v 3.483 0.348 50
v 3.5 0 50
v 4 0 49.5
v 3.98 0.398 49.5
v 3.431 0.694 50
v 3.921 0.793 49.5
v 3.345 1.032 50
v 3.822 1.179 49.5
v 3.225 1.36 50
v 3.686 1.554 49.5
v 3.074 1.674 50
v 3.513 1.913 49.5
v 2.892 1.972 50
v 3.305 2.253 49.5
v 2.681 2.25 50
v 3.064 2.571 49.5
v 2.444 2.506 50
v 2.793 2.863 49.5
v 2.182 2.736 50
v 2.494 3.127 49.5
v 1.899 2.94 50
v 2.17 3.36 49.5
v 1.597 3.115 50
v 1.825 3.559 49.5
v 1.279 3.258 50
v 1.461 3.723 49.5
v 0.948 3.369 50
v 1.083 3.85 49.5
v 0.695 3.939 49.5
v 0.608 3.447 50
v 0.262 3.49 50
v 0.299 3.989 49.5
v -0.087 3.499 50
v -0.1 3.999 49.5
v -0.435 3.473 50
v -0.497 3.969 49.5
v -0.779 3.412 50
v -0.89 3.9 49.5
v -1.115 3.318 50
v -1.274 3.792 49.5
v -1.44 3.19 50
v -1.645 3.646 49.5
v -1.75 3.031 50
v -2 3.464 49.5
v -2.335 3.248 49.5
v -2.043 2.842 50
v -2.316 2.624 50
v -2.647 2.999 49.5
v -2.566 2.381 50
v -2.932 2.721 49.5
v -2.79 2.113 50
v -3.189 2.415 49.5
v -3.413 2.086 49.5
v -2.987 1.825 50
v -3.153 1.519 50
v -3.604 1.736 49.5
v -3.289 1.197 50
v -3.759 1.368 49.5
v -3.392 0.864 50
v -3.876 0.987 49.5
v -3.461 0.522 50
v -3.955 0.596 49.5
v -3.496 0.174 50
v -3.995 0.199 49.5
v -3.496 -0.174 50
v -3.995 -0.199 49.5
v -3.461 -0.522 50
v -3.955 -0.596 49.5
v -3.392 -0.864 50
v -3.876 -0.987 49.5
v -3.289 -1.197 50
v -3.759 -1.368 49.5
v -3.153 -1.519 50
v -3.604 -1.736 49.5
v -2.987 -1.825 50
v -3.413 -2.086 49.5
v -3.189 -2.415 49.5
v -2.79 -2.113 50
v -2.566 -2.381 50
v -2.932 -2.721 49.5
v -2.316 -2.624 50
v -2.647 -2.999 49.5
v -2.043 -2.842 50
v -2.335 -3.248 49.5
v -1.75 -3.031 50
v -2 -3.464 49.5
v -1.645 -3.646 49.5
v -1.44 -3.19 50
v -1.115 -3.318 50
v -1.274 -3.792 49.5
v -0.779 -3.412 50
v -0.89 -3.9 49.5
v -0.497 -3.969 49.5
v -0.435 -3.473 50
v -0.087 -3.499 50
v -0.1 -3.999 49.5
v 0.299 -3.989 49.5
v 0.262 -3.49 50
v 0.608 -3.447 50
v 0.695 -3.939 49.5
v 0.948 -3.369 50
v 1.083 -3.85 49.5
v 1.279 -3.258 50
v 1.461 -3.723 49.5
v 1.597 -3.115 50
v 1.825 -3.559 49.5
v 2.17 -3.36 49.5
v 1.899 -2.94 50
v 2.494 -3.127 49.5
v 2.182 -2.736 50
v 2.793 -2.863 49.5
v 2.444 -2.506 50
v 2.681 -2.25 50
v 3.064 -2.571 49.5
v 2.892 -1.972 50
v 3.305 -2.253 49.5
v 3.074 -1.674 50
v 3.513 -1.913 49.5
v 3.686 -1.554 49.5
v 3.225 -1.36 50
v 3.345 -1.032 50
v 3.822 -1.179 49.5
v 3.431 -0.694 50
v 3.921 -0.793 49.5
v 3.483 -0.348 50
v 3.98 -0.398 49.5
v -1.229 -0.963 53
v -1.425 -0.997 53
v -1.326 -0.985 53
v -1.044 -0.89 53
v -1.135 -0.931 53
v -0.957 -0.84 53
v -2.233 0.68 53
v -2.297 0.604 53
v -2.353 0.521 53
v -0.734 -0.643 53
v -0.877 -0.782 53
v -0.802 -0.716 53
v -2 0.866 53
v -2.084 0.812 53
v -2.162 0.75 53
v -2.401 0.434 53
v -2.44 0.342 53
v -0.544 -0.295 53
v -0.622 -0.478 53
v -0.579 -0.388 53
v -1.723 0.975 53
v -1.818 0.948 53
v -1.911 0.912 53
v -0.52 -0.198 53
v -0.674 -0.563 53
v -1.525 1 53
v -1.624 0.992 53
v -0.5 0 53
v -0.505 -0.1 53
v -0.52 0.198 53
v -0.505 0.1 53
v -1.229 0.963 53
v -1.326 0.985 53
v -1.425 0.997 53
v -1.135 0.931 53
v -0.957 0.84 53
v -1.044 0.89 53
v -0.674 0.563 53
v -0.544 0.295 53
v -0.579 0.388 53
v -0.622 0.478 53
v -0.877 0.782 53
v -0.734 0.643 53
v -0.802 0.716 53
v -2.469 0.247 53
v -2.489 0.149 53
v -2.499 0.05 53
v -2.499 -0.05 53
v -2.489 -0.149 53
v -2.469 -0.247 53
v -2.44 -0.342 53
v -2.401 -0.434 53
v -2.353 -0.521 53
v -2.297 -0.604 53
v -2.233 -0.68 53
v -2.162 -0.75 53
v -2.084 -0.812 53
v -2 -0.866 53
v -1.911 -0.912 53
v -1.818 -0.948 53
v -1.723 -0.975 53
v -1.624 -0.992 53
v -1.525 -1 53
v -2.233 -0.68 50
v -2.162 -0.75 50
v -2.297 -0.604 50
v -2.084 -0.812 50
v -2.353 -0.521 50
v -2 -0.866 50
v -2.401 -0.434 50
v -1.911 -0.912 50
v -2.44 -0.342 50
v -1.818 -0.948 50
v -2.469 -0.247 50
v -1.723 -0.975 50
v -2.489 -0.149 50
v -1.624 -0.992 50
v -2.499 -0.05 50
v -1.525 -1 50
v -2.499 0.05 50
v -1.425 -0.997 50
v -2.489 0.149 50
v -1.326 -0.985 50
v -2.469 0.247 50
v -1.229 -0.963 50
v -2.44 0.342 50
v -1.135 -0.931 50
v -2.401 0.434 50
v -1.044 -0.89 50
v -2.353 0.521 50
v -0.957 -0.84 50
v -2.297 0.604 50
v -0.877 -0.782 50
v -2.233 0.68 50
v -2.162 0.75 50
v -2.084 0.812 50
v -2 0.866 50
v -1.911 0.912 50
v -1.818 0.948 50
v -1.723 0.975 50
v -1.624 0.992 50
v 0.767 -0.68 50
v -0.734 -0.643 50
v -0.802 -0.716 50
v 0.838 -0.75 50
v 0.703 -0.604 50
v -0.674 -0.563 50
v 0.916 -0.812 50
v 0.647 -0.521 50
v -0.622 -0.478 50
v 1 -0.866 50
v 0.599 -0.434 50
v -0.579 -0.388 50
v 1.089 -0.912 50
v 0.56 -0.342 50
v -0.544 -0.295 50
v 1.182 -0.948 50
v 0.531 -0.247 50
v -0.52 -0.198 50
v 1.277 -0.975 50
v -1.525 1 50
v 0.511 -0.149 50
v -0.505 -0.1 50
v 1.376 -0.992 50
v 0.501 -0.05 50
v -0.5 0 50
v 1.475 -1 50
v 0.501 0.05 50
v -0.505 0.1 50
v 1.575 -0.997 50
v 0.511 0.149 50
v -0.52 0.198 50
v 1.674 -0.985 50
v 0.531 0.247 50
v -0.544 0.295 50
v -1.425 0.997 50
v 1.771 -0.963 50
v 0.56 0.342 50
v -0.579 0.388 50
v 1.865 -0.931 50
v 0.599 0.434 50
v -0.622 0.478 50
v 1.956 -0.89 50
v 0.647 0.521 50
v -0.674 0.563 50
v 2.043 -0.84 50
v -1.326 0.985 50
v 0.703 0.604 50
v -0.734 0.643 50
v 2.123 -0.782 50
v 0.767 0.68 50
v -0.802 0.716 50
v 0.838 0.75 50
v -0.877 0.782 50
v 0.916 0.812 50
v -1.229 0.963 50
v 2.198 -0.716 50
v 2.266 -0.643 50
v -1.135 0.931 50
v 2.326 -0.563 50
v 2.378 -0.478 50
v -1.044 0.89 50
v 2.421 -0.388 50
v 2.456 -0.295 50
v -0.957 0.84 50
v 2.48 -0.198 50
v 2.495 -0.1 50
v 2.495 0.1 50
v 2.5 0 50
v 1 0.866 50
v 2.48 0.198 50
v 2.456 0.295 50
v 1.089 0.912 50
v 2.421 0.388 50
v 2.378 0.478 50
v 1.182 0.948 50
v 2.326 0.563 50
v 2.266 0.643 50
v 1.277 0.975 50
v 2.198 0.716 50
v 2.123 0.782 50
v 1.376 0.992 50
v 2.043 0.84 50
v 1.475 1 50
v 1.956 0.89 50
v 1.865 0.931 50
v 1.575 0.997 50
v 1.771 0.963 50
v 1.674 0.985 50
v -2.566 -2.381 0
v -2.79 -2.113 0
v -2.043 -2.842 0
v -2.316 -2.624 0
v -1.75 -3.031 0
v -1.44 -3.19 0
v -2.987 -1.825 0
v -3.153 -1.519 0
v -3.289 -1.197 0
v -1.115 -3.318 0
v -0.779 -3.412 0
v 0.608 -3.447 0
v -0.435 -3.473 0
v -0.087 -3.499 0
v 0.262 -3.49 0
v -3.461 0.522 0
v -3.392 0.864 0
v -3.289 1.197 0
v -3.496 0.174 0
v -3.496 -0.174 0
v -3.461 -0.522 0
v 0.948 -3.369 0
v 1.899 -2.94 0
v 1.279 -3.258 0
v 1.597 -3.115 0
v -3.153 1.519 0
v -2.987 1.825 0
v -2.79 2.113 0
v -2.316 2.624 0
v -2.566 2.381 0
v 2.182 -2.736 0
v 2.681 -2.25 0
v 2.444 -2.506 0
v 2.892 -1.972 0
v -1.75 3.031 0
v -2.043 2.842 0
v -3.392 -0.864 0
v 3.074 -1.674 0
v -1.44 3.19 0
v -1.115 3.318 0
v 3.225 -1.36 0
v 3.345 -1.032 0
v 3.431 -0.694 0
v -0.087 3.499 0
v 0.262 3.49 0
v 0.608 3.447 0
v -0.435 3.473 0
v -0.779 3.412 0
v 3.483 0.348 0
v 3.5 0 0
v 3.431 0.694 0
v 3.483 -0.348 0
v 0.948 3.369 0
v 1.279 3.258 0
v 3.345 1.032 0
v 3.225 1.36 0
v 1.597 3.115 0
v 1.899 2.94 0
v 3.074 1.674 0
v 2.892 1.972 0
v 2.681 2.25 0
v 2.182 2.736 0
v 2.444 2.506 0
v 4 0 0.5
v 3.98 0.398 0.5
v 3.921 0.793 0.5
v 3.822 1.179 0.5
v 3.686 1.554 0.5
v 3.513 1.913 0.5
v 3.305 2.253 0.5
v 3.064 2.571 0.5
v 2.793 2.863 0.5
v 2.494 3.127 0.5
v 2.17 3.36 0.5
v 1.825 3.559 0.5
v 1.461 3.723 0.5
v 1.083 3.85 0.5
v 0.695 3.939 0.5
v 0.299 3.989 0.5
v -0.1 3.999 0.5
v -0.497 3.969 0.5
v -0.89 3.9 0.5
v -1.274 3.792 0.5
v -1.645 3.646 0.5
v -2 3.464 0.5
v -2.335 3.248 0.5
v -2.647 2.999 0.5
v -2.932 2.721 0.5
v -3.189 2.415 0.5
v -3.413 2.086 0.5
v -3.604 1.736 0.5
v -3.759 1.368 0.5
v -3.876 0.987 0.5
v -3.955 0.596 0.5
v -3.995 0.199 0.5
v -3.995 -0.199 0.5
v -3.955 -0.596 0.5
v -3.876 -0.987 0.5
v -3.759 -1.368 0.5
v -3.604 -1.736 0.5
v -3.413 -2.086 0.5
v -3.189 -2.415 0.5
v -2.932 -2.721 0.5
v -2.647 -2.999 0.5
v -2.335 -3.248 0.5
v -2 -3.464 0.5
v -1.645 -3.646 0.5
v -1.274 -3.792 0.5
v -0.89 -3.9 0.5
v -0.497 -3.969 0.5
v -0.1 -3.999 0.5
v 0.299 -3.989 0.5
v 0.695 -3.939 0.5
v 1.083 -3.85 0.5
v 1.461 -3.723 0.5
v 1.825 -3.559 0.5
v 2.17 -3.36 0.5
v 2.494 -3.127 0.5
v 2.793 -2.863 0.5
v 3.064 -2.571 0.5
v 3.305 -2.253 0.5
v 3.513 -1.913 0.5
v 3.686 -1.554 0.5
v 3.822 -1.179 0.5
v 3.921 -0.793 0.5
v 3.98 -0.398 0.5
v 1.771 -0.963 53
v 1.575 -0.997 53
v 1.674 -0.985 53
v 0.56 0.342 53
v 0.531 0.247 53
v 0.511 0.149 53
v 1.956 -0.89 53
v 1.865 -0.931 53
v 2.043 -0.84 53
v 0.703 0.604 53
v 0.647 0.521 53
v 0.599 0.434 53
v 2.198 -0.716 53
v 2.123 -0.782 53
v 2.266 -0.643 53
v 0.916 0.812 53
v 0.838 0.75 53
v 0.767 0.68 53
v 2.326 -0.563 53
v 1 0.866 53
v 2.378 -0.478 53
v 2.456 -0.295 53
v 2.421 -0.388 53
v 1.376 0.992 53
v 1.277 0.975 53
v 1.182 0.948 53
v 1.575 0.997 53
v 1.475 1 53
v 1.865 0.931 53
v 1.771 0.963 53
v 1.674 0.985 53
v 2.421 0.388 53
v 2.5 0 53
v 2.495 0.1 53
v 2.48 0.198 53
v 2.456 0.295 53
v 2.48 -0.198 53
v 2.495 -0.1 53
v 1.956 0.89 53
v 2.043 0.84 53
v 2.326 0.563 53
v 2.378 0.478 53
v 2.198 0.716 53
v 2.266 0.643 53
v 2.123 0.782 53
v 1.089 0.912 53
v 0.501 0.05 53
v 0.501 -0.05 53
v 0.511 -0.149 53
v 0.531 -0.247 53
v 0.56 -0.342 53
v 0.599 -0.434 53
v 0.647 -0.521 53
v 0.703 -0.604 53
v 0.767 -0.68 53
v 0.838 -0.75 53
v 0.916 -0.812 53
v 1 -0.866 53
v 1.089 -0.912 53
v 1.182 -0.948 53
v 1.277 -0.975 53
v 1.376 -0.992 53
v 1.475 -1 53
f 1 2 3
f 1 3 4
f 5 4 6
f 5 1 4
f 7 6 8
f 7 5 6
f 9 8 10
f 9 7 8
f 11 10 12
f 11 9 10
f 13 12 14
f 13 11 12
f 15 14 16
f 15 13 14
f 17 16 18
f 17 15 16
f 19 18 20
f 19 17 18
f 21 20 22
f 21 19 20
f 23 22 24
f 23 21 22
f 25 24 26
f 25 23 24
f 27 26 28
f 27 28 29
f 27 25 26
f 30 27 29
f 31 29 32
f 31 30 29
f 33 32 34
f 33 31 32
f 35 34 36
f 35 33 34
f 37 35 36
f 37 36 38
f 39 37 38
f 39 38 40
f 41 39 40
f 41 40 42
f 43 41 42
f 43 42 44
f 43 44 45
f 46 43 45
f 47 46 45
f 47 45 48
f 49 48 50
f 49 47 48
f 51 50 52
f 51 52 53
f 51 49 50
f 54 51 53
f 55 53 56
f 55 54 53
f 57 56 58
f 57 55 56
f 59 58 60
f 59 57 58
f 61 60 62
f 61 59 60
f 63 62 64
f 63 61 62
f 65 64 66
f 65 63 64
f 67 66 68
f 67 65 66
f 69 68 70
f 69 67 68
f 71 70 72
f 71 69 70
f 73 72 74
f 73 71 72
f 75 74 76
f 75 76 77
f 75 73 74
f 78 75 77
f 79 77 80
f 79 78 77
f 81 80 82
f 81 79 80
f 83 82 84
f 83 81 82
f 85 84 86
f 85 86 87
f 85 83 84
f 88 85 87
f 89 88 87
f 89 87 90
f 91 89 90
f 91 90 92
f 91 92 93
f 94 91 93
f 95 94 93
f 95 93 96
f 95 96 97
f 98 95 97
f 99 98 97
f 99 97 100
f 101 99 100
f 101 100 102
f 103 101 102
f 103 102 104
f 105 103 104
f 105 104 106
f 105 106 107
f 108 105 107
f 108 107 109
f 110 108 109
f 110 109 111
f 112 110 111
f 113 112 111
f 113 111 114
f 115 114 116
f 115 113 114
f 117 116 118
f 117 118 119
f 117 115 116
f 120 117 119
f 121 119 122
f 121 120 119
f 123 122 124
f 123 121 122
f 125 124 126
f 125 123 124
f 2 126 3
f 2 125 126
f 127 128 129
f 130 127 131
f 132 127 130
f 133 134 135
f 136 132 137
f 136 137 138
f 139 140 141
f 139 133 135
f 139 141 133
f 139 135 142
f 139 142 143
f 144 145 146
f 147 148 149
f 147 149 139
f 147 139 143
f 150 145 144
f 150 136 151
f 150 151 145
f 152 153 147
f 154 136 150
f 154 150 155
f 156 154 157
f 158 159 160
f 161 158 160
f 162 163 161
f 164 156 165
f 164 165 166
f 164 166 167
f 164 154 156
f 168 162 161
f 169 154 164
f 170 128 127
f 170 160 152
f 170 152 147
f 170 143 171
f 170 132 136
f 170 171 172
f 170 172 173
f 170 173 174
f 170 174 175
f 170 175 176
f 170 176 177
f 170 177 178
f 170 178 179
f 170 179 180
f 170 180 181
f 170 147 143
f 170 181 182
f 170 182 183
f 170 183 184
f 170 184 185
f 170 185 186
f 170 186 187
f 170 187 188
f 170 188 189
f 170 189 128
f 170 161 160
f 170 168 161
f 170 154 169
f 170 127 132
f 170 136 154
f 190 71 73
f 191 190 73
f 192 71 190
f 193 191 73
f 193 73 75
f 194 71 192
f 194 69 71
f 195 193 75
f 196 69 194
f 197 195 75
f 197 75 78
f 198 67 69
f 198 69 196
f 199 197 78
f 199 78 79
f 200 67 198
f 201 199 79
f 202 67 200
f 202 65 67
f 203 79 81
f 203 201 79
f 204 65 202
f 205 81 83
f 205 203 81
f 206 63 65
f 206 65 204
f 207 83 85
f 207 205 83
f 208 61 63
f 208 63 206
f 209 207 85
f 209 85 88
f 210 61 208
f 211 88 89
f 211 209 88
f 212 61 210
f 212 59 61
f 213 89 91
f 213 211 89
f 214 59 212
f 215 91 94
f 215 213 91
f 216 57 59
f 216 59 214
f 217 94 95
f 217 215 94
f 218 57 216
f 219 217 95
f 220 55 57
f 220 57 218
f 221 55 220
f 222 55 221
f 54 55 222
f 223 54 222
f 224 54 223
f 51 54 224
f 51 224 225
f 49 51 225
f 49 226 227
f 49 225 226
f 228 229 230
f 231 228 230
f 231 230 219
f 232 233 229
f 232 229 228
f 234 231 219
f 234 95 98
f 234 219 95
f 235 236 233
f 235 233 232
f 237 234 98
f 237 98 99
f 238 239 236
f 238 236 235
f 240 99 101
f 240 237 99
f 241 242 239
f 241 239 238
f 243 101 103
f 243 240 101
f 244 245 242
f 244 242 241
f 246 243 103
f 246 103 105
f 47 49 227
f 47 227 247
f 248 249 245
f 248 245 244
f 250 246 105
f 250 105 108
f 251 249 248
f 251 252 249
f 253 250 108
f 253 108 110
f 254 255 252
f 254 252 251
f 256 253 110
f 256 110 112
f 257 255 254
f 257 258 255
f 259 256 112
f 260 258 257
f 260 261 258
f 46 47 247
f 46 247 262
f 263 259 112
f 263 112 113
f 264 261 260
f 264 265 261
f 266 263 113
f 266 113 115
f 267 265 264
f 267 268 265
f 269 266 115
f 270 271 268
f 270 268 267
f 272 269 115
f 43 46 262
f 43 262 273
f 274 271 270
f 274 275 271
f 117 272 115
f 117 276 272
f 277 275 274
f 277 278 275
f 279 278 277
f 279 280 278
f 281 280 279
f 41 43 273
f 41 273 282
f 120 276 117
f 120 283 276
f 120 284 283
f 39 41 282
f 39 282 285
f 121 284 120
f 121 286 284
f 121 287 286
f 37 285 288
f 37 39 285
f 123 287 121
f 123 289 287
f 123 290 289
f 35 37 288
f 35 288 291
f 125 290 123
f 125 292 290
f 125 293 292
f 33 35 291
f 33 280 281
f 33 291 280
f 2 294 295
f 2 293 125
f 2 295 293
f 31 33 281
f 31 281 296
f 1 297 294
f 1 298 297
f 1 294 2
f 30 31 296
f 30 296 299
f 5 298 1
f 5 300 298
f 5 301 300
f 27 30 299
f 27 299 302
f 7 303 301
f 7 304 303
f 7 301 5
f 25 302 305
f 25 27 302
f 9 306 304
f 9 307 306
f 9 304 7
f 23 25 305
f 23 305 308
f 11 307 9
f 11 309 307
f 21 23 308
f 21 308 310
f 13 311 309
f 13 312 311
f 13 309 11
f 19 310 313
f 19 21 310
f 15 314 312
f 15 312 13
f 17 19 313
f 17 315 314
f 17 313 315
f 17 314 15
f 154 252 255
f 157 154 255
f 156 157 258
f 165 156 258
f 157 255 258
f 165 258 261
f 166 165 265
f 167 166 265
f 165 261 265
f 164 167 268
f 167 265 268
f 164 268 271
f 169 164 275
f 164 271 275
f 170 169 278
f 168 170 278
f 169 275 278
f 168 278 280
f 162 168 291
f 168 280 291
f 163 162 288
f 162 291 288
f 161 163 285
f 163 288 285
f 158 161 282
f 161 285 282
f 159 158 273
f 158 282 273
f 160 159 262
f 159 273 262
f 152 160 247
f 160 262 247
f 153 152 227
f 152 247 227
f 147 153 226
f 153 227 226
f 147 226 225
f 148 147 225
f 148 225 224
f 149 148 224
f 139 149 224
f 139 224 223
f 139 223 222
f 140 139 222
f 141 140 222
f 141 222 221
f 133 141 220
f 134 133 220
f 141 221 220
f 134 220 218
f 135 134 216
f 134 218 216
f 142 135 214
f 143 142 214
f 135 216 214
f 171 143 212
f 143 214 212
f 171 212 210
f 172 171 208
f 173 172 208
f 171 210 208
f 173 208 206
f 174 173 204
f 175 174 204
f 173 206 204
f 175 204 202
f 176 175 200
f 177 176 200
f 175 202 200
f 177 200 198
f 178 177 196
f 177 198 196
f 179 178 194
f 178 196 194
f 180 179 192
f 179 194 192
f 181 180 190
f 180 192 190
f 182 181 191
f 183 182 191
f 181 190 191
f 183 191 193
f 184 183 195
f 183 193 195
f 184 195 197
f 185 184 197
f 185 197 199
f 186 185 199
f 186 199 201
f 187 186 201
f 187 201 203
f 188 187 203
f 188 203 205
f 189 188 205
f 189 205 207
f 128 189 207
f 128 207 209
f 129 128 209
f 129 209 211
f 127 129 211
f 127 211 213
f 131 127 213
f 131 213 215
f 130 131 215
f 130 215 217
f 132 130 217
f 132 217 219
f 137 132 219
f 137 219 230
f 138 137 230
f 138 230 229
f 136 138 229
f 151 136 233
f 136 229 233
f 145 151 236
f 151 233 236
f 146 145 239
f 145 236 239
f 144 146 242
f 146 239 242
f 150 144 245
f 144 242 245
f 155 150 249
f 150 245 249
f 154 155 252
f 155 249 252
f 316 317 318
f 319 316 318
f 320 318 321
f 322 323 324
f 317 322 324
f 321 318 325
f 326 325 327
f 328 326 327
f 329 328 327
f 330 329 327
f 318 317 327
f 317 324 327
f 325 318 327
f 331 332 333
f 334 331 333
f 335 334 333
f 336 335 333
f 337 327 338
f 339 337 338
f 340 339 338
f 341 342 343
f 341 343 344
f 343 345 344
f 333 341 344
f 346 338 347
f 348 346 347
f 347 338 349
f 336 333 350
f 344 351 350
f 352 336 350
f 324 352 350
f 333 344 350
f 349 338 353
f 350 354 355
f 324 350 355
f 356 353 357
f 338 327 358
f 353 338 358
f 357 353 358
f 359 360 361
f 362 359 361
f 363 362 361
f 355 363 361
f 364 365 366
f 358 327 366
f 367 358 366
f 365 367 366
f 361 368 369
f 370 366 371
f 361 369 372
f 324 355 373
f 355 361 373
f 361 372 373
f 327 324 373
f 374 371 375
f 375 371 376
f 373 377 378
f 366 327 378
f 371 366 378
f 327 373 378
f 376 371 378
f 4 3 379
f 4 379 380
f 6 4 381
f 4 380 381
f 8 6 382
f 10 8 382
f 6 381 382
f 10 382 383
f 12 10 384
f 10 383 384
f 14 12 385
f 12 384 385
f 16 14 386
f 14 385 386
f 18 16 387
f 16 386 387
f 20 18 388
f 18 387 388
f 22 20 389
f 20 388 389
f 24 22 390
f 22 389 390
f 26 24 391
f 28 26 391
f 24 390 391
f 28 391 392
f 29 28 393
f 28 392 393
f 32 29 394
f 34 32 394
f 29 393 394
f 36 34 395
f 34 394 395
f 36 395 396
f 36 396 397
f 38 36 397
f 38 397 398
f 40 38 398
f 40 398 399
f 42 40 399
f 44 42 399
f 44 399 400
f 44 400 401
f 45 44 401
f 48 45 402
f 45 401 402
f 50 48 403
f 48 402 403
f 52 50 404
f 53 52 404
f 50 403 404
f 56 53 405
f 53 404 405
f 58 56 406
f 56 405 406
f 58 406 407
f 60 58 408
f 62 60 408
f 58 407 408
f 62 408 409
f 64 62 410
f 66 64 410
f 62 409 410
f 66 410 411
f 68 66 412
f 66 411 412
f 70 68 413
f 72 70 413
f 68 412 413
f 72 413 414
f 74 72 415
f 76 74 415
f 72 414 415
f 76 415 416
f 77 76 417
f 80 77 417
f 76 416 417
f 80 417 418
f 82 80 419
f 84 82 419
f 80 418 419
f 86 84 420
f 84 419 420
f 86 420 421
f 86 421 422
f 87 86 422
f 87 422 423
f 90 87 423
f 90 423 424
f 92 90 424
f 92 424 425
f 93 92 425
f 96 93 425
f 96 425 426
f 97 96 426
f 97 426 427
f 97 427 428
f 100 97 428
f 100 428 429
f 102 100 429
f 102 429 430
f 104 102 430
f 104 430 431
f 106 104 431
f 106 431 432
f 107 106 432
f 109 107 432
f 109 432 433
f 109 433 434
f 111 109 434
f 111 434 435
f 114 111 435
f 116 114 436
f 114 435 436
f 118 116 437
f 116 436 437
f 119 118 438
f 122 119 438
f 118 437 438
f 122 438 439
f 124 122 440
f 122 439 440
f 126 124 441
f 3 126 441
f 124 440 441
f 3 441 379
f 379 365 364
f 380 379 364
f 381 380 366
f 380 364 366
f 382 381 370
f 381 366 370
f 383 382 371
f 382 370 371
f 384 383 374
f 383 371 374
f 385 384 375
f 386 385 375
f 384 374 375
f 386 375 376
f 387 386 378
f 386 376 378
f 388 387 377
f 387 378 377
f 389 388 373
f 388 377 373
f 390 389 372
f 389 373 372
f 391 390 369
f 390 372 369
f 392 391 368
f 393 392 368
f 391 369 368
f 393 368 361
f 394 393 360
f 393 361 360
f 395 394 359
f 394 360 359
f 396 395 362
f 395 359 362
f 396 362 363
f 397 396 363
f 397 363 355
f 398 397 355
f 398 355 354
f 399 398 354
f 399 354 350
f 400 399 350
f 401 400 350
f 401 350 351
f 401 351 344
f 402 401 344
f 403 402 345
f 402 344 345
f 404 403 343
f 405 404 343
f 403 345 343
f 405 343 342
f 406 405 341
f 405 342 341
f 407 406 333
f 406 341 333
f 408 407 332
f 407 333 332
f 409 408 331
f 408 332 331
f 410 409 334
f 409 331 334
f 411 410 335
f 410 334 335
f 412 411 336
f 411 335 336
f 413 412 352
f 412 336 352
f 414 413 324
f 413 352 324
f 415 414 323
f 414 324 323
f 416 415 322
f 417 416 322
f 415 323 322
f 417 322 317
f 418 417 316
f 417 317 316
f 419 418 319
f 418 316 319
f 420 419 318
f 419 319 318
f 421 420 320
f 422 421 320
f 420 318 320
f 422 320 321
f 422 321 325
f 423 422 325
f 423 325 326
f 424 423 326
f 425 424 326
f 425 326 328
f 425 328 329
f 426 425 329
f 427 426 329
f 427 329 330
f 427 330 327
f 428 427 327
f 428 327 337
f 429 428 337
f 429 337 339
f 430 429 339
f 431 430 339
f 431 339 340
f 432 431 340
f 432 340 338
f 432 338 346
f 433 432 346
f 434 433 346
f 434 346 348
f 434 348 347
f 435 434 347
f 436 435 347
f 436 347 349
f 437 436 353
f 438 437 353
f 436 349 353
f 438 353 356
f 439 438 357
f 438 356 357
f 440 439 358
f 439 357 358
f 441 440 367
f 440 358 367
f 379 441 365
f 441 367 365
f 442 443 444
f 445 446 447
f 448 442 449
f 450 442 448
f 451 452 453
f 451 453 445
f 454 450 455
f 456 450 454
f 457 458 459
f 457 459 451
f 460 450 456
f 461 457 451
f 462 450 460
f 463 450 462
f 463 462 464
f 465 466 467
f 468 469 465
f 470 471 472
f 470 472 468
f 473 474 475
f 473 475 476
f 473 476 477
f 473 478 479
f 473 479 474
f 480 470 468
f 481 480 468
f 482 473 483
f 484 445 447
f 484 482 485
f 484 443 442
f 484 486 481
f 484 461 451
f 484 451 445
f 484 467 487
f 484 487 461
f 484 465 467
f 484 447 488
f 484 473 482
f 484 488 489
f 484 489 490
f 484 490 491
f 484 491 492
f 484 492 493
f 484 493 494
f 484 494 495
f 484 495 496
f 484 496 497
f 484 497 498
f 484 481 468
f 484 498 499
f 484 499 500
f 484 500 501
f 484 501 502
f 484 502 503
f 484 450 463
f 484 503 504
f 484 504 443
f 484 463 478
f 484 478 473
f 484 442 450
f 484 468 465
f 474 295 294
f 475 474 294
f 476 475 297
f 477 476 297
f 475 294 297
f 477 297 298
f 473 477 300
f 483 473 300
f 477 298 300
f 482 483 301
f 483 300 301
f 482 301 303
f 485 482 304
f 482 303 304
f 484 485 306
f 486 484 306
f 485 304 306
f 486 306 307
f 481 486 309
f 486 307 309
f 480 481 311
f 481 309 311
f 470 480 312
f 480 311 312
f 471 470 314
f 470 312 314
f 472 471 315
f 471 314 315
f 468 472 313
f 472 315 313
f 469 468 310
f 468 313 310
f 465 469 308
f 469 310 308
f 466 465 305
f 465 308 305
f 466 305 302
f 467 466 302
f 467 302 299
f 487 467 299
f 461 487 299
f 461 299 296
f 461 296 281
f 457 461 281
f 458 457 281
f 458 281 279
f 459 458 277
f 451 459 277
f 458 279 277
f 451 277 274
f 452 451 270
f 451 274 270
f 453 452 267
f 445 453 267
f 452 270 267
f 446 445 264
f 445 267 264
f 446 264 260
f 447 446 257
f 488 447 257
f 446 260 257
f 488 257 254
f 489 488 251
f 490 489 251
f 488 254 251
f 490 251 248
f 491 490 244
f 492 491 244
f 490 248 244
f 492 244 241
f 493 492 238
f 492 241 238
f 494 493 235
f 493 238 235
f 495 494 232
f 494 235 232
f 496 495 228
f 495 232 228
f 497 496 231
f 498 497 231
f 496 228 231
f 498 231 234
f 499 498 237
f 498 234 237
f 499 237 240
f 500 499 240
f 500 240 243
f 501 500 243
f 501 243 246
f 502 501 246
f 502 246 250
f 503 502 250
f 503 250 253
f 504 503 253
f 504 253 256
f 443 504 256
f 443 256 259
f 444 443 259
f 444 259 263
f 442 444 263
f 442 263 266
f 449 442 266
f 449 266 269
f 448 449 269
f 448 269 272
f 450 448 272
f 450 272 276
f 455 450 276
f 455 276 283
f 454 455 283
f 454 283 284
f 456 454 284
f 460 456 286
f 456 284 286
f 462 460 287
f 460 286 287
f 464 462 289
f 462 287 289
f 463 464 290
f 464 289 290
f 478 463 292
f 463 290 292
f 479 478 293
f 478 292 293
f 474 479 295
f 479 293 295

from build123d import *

# Parameters (mm, degrees)
F0_R     = 4
F1_DEPTH = 50
F2_SIZE  = 0.5
F3_R     = 1
F4_DEPTH = 3


with BuildPart() as f1:
    # F0 (on Top) → F1 (new body)
    with BuildSketch(Plane.XY):
        Circle(F0_R)
    extrude(amount=F1_DEPTH)

    # F2
    f2_edges = [f1.edges().sort_by_distance(p)[0] for p in [
        (-4, 0, 50),
        (-4, 0, 0),
    ]]
    chamfer(f2_edges, length=F2_SIZE)

    # F3 (on face) → F4 (join)
    with BuildSketch(Plane.XY.offset(50)):
        with Locations((1.5, 0)):
            Circle(F3_R)
        with Locations((-1.5, 0)):
            Circle(F3_R)
    extrude(amount=F4_DEPTH)


solid = f1.part
